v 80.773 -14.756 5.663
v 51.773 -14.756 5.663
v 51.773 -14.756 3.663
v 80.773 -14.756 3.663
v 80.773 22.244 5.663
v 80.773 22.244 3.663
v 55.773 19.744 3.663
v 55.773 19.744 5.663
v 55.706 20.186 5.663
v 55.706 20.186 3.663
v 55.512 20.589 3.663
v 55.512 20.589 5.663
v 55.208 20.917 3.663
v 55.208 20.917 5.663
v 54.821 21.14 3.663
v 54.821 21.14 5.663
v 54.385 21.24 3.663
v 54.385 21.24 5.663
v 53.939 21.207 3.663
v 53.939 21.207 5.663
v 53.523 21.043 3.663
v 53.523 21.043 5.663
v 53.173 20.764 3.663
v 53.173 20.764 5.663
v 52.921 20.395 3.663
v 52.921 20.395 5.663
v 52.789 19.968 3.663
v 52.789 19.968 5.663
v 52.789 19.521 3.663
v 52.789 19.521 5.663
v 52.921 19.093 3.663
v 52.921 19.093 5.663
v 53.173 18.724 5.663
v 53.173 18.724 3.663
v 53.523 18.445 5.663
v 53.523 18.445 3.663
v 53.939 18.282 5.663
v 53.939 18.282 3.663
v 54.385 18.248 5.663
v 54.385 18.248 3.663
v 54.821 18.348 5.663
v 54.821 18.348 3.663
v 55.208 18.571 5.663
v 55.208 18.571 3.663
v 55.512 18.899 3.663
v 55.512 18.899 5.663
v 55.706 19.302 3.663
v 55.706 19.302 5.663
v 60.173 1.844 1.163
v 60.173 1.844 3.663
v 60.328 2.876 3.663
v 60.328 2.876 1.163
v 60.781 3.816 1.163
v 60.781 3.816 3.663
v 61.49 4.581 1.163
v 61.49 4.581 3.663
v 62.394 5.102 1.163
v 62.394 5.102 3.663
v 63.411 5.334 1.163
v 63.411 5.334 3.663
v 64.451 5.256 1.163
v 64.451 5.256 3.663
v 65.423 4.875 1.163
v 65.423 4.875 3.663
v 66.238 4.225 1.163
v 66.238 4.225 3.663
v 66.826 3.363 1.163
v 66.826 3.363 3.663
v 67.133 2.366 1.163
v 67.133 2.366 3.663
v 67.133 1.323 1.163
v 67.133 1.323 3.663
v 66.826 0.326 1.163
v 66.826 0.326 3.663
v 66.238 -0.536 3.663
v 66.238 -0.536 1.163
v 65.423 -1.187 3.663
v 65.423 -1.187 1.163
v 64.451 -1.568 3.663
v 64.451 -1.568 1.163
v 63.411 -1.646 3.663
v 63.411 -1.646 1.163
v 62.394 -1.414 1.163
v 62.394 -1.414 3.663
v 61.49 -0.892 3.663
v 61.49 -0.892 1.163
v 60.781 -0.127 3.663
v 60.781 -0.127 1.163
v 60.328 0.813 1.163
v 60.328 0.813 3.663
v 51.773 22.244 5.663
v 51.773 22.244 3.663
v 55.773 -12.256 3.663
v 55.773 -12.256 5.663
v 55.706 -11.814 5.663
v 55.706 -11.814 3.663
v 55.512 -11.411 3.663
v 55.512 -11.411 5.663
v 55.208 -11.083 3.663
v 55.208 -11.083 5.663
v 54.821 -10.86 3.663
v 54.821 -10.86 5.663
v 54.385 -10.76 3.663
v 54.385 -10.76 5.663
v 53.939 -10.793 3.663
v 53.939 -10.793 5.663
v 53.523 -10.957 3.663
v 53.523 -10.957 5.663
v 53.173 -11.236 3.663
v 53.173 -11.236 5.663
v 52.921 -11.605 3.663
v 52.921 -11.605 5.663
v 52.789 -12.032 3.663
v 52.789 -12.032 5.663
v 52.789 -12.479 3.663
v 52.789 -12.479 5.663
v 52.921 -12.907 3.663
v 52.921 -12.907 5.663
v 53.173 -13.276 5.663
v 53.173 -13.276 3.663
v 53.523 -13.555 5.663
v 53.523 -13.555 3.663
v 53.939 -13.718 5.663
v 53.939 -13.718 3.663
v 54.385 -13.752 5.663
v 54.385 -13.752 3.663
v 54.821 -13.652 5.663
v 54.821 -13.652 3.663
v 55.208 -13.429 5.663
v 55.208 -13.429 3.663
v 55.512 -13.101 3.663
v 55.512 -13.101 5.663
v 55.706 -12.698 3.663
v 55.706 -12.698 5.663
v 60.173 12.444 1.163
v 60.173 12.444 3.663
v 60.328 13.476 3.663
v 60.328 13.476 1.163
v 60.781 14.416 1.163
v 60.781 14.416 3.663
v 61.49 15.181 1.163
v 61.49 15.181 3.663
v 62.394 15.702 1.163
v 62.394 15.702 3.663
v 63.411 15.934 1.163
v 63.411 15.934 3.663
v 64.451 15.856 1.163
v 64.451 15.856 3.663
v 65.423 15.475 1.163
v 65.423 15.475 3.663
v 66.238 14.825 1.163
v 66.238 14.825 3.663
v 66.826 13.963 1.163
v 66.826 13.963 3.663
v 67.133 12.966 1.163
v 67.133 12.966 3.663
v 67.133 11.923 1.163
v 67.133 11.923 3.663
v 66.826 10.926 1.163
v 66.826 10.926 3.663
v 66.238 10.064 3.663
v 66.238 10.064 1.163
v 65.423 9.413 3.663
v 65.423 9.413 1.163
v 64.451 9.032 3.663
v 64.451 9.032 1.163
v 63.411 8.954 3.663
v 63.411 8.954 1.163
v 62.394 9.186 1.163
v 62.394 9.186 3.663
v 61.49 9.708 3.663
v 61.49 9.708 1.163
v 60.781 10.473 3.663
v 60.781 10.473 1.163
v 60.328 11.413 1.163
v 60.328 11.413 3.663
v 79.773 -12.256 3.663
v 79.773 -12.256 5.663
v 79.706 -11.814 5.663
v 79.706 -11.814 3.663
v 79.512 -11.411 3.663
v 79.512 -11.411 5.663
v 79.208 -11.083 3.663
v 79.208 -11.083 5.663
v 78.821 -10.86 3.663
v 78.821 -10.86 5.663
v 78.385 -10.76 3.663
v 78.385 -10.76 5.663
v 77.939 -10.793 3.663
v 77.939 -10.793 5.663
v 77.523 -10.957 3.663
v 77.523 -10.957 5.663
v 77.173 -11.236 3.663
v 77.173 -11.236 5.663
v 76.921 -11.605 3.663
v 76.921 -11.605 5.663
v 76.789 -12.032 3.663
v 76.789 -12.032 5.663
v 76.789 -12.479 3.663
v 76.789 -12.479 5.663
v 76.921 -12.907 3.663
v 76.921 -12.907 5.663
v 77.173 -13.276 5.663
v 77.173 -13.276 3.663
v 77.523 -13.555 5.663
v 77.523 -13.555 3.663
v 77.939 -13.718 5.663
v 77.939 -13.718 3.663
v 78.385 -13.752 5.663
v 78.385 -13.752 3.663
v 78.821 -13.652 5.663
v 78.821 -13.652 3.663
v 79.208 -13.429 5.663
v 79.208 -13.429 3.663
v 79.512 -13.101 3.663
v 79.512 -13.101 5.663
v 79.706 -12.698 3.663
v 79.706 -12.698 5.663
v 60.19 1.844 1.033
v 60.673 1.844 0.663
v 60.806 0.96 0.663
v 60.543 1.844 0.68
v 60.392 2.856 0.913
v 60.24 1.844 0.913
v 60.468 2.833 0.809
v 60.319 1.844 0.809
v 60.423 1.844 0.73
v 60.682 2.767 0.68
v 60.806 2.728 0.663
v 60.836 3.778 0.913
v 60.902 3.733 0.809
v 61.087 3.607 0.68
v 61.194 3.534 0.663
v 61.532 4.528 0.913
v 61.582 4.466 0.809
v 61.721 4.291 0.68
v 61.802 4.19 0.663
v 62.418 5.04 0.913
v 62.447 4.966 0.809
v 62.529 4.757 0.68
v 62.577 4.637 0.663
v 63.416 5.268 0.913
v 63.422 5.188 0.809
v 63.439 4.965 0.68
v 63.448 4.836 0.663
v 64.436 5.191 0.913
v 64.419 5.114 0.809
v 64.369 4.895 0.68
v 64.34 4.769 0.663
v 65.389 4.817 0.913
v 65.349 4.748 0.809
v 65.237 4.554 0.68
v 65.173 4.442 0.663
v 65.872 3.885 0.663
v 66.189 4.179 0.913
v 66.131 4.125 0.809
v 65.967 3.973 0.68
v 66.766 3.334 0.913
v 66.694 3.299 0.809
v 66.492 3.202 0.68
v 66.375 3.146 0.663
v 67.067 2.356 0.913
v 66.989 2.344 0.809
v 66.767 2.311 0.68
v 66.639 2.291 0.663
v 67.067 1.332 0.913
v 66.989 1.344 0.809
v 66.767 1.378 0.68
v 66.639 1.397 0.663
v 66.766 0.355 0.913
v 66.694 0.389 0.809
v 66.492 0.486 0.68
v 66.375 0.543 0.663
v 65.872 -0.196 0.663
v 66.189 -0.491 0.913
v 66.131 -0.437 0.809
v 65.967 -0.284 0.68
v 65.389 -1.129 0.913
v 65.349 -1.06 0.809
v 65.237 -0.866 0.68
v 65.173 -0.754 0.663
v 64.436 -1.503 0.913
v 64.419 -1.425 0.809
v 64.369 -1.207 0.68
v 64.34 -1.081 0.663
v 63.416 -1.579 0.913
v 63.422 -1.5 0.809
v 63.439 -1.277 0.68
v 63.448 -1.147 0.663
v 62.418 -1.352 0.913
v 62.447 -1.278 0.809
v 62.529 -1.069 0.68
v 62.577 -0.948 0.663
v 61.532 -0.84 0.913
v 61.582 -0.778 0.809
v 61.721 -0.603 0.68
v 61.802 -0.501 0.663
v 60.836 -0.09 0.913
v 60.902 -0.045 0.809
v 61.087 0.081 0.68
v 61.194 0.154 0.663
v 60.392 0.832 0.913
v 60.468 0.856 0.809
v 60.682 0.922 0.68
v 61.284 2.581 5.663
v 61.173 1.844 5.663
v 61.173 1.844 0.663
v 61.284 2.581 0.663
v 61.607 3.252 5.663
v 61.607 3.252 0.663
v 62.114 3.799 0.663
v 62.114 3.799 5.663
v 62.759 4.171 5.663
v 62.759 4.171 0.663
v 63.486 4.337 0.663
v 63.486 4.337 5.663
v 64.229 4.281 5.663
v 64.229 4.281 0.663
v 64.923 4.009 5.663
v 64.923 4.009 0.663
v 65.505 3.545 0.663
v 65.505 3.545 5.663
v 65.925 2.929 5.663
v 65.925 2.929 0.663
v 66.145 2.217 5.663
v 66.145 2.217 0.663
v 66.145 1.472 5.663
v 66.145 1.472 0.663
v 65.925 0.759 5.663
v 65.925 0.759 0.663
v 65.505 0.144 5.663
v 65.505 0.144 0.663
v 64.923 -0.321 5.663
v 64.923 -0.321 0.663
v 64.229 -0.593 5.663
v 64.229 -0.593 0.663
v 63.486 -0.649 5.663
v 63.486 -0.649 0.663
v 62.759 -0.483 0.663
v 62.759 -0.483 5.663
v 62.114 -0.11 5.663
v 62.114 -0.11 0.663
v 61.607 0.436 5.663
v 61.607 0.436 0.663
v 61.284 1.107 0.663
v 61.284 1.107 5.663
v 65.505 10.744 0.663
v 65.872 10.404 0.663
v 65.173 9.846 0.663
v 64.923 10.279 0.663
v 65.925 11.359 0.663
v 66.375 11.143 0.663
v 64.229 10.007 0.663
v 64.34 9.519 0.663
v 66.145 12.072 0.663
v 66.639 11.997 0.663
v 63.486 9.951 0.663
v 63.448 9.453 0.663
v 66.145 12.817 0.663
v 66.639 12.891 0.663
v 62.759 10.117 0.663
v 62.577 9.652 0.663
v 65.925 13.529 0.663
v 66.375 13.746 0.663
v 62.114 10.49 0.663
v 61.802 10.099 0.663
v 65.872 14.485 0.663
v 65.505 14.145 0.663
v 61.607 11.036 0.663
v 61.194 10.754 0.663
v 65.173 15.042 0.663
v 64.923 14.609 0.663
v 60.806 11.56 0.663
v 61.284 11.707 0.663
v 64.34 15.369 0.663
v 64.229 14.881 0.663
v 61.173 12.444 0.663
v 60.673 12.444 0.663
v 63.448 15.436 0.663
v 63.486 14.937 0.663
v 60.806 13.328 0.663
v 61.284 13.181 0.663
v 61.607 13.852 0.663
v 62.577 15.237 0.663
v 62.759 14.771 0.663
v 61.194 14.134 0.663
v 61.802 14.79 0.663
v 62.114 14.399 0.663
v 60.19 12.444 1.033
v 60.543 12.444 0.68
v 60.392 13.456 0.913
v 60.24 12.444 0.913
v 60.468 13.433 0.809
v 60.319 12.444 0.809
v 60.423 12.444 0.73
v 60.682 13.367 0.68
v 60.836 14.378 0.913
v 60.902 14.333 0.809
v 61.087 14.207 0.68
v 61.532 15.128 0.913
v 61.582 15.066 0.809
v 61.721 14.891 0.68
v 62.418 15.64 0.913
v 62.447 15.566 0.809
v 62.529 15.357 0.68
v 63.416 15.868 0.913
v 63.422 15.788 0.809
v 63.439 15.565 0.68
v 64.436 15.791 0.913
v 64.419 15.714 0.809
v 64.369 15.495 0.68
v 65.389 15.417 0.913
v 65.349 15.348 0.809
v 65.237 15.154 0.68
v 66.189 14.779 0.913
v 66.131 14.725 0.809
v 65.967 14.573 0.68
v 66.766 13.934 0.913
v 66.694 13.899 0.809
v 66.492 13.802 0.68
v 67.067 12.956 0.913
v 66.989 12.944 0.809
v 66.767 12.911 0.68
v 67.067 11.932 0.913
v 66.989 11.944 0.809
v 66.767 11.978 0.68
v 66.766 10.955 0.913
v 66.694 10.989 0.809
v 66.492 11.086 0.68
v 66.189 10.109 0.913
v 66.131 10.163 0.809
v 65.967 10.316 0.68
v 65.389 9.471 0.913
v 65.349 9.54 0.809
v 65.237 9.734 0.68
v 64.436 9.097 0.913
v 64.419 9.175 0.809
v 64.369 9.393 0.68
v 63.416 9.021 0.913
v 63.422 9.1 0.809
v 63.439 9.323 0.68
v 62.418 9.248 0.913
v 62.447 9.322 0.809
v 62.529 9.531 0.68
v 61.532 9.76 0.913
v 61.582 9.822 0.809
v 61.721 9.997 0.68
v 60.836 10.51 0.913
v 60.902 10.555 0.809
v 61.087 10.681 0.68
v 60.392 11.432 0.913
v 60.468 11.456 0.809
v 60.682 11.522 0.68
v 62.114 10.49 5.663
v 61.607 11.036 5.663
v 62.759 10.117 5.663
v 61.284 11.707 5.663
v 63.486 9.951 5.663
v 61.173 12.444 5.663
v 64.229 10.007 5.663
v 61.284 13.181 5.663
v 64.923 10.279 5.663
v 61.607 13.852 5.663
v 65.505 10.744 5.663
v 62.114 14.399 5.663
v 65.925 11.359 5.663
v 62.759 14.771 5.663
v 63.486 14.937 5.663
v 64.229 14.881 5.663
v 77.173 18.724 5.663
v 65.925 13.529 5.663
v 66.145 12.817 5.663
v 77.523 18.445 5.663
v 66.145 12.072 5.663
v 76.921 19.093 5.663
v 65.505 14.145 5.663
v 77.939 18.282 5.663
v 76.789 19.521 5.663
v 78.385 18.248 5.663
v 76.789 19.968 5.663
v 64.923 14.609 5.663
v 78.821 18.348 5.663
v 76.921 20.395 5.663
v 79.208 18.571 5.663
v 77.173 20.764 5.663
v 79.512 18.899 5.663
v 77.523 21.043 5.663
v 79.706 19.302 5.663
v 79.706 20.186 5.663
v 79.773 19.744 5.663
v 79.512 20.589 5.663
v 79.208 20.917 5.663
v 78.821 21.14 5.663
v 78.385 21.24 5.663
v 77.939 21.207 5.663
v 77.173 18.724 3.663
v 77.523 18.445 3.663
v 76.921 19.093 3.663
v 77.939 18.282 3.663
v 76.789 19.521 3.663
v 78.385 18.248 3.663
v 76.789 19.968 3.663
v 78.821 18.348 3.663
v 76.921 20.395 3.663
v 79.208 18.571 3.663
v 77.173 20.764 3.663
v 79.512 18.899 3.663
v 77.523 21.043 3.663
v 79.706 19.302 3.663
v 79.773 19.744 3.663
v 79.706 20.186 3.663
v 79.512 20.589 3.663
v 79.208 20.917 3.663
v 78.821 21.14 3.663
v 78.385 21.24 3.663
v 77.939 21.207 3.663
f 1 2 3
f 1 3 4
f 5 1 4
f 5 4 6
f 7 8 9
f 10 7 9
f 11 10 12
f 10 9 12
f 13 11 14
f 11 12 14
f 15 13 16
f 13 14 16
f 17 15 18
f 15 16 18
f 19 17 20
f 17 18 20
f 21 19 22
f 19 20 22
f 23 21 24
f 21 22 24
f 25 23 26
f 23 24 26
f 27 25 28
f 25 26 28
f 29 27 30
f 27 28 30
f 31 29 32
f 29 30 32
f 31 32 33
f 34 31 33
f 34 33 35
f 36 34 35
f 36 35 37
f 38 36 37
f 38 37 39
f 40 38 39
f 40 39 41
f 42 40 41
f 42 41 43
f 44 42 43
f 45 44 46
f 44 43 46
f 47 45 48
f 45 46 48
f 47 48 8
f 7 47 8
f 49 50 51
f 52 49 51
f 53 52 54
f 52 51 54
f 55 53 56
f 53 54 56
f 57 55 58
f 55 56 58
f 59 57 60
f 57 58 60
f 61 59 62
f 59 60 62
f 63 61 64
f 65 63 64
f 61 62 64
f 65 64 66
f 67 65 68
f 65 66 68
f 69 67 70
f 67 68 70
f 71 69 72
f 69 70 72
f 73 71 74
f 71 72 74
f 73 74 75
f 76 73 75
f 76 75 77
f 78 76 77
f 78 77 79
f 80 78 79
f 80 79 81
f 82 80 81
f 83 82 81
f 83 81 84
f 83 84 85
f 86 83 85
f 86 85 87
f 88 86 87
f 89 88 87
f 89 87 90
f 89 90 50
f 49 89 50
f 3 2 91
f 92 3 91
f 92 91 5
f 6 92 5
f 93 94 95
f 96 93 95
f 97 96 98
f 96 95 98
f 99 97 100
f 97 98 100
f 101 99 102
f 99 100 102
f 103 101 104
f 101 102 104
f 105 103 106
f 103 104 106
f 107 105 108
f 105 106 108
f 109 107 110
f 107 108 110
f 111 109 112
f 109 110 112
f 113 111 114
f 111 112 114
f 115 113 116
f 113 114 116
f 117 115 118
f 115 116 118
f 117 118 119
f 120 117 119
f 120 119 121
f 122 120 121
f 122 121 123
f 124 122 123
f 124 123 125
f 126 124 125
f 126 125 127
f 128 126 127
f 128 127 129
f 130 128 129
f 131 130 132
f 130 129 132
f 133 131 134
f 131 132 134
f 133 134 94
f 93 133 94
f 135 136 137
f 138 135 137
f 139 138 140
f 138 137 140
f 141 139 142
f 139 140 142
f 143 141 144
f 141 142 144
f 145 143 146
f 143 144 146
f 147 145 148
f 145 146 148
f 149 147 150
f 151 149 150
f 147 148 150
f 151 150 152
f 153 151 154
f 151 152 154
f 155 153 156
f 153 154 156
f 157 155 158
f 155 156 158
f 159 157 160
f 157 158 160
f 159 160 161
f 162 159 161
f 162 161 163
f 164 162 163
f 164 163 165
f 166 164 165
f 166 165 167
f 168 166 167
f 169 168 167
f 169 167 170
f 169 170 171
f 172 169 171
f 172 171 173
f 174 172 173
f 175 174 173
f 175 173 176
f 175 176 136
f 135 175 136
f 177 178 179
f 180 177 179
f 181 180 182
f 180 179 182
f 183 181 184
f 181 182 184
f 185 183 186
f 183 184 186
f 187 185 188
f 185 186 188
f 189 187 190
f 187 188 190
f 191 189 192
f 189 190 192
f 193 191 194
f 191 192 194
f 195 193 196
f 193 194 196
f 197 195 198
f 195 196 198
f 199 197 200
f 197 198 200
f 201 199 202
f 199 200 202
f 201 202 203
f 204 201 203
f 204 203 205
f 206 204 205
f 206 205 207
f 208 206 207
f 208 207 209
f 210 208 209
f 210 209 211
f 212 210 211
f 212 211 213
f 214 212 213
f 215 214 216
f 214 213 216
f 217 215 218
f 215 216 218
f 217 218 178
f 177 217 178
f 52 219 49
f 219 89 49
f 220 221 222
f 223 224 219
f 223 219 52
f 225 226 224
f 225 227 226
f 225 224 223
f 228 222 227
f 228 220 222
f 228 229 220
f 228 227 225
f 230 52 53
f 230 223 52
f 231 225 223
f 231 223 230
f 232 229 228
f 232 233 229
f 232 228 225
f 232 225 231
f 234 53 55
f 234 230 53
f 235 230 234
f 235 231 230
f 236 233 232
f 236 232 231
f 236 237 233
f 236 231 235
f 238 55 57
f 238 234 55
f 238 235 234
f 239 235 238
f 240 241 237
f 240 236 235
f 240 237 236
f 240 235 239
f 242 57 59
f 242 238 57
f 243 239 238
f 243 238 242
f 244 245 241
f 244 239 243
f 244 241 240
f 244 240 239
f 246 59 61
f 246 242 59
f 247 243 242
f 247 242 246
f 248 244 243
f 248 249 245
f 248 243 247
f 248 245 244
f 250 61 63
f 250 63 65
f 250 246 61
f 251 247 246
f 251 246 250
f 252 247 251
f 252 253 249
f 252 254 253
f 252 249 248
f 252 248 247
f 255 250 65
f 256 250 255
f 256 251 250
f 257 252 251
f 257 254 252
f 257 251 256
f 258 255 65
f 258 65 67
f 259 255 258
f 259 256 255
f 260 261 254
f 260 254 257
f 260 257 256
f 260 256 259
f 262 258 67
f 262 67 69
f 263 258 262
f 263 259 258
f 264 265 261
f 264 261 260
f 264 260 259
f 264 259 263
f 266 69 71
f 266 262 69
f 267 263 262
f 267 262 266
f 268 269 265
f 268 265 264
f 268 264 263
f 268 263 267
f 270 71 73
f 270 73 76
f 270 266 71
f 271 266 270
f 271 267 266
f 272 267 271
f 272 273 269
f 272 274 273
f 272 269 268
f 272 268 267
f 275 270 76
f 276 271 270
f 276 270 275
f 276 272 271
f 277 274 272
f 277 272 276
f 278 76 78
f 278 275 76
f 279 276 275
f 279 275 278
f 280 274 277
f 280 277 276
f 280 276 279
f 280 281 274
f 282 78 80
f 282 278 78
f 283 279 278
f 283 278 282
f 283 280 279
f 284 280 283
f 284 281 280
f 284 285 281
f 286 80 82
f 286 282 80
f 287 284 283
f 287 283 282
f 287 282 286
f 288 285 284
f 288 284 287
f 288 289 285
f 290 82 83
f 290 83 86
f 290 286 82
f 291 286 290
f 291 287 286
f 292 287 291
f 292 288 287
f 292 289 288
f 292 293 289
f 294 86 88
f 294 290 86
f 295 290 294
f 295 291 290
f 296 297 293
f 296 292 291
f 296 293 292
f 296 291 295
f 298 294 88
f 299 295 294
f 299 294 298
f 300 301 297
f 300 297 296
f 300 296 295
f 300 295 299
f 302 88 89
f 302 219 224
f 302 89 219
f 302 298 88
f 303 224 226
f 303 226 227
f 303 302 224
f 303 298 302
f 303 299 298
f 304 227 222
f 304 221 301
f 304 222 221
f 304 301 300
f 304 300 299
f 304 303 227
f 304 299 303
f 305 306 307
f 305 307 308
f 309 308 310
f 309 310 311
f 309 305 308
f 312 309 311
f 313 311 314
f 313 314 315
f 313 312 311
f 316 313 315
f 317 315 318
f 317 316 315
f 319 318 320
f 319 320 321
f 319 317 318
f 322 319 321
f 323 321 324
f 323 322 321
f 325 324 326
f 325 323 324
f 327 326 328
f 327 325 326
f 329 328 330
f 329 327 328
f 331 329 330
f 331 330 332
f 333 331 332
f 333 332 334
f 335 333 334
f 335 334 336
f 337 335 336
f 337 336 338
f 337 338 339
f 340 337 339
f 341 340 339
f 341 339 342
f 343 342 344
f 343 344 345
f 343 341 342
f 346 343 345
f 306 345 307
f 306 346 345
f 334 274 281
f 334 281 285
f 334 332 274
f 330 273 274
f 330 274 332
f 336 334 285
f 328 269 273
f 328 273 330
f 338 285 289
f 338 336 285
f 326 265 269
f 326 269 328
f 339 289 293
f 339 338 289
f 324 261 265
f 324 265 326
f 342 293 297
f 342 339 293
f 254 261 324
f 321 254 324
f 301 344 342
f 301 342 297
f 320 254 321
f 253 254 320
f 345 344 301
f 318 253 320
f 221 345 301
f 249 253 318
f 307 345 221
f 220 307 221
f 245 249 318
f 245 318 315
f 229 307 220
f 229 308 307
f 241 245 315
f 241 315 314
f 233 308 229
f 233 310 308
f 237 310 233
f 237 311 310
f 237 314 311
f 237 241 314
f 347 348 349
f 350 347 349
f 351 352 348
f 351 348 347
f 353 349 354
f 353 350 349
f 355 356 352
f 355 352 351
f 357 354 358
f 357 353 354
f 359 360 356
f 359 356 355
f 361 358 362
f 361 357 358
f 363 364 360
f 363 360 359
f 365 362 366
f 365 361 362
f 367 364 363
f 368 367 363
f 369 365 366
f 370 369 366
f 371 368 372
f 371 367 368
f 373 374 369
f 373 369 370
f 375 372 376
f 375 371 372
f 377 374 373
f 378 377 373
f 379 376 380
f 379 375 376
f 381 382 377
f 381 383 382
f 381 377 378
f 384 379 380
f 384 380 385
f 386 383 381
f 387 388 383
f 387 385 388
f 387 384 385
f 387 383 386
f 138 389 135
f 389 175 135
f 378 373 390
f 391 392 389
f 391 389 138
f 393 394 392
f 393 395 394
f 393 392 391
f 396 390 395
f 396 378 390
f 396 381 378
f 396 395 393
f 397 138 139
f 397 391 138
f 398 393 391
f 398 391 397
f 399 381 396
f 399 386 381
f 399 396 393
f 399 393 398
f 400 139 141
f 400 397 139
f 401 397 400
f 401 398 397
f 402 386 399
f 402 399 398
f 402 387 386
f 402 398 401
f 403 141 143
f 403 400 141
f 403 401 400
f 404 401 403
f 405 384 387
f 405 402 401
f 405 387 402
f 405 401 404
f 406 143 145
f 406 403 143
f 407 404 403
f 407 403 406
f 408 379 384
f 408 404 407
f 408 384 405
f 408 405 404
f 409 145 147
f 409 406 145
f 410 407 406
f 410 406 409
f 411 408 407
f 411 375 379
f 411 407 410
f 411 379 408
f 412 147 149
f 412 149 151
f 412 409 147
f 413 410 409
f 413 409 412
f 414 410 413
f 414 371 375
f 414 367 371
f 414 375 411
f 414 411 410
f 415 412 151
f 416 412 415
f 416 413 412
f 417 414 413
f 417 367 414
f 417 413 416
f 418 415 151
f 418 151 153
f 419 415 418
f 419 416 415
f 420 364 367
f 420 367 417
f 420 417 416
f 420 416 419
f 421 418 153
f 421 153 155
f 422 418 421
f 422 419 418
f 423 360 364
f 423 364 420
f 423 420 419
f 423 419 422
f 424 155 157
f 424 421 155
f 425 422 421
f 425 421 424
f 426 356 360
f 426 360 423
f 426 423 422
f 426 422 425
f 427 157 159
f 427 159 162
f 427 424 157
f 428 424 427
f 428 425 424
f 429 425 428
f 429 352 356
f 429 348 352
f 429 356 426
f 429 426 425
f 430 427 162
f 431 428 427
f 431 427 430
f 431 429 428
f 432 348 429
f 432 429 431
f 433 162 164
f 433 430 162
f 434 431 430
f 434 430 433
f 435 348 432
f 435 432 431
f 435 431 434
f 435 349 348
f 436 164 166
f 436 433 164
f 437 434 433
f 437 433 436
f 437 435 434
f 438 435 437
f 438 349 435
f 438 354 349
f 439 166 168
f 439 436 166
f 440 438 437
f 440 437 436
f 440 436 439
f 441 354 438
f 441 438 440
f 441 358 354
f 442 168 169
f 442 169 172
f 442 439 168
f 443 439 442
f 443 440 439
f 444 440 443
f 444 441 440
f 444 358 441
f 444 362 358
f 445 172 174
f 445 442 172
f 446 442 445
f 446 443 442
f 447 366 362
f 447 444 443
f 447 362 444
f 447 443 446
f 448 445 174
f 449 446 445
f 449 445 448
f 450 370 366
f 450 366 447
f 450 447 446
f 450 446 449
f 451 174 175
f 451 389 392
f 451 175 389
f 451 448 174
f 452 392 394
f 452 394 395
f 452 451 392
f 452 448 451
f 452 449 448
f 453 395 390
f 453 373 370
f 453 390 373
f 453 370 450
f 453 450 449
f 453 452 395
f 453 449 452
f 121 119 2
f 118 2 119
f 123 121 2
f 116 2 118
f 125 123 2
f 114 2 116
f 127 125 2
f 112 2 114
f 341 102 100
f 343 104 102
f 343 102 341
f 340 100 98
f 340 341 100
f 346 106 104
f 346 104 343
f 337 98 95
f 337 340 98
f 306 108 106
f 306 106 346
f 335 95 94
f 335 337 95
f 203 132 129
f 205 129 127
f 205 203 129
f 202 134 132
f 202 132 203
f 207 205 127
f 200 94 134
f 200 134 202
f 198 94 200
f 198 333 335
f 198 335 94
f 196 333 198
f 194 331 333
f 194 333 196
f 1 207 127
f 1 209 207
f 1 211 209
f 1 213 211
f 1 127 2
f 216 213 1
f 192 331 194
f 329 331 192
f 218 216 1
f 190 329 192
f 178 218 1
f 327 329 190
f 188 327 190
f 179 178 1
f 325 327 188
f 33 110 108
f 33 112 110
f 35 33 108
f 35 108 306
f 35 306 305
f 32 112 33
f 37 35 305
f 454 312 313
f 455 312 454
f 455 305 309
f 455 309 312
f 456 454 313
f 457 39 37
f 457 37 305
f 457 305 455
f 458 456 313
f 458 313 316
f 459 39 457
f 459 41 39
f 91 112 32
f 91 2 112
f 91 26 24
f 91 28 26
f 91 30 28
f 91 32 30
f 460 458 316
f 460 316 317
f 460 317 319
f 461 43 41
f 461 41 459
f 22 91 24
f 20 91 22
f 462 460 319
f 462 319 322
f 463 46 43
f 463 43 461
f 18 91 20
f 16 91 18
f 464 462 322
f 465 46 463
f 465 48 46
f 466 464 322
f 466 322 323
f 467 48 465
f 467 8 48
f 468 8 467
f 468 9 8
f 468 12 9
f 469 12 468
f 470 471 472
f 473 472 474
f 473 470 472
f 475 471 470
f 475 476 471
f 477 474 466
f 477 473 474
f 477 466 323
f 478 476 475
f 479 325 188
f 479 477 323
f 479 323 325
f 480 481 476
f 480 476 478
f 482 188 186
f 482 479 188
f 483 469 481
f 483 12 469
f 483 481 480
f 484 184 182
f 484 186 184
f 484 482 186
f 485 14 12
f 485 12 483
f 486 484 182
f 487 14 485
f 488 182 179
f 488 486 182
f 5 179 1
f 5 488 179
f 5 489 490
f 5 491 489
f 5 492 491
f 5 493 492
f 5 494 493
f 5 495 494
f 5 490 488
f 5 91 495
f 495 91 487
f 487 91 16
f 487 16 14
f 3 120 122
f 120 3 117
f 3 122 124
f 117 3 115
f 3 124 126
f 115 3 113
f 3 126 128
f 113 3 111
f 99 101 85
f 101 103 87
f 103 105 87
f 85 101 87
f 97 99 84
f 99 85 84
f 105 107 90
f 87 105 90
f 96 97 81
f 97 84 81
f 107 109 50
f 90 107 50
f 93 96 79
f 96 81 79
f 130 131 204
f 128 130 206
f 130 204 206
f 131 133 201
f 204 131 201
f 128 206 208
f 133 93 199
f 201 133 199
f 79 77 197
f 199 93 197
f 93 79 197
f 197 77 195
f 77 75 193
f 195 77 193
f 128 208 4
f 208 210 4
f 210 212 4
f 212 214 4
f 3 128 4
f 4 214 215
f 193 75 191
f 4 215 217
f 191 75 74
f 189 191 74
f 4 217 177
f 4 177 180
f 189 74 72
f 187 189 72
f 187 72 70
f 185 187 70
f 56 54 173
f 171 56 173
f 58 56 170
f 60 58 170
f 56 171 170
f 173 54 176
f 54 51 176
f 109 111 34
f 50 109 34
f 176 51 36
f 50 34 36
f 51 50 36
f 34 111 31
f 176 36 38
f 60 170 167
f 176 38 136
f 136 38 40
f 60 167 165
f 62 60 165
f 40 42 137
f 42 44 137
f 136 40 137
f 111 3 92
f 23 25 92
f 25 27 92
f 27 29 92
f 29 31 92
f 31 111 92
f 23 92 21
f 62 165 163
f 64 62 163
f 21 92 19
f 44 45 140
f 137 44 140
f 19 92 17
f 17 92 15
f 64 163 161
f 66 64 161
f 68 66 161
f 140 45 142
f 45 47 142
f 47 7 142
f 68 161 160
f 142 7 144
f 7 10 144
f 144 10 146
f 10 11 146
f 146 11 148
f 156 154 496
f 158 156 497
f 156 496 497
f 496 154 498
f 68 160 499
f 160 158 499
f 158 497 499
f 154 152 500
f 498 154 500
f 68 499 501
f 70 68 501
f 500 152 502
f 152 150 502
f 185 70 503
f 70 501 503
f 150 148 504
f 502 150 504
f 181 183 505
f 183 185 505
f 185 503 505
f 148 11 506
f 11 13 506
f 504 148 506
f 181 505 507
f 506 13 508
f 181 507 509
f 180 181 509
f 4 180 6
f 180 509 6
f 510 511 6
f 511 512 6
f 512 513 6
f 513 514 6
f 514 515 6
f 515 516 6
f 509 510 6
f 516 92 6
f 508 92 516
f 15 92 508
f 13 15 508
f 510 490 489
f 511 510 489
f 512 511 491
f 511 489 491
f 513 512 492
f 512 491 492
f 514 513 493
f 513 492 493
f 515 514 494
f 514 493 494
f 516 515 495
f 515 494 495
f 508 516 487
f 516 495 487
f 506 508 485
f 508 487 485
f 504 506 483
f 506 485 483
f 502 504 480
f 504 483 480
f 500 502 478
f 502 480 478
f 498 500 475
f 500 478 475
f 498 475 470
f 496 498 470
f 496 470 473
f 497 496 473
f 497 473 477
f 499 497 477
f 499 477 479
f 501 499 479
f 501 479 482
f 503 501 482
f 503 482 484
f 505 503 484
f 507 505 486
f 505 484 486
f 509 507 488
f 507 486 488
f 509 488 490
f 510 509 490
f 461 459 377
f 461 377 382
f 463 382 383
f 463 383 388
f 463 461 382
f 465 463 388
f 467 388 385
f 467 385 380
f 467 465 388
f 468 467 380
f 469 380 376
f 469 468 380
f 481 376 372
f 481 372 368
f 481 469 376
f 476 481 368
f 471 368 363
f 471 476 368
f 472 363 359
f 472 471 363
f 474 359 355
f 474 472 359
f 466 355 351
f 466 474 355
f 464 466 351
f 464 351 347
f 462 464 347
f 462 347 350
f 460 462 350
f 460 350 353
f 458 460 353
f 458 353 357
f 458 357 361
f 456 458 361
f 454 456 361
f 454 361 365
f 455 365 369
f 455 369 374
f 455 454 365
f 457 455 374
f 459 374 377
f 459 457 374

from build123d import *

# Parameters (mm, degrees)
SKETCH2_W           = 19
SKETCH2_H           = 27
SKETCH2_R           = 3.5
BOSS_EXTRUDE1_DEPTH = 2
SKETCH3_R           = 3.5
SKETCH3_R_2         = 2.5
BOSS_EXTRUDE2_DEPTH = 5
FILLET1_R           = 0.5
SKETCH6_W           = 29
SKETCH6_H           = 37
SKETCH6_R           = 1.5
SKETCH6_W_2         = 19
SKETCH6_H_2         = 27
BOSS_EXTRUDE6_DEPTH = 2


with BuildPart() as part:
    # Sketch2 → Boss-Extrude1 (new body)
    with BuildSketch(Plane(origin=(0, 0, 5.662636572), x_dir=(-1, 0, 0), z_dir=(0, 0, -1))):
        with Locations((-66.272536925, 3.74415348)):
            Rectangle(SKETCH2_W, SKETCH2_H)
        with Locations((-63.672536925, 12.44415348)):
            Circle(SKETCH2_R, mode=Mode.SUBTRACT)
        with Locations((-63.672536925, 1.84415348)):
            Circle(SKETCH2_R, mode=Mode.SUBTRACT)
    extrude(amount=BOSS_EXTRUDE1_DEPTH)

    # Sketch3 → Boss-Extrude2 (add)
    # profile 1 of 2: a face of its own
    with BuildSketch(Plane(origin=(0, 0, 5.662636572), x_dir=(-1, 0, 0), z_dir=(0, 0, -1))):
        with Locations((-63.672536925, 12.44415348)):
            Circle(SKETCH3_R)
        with Locations((-63.672536925, 12.44415348)):
            Circle(SKETCH3_R_2, mode=Mode.SUBTRACT)
    # profile 2 of 2: a face of its own
    with BuildSketch(Plane(origin=(0, 0, 5.662636572), x_dir=(-1, 0, 0), z_dir=(0, 0, -1))):
        with Locations((-63.672536925, 1.84415348)):
            Circle(SKETCH3_R)
        with Locations((-63.672536925, 1.84415348)):
            Circle(SKETCH3_R_2, mode=Mode.SUBTRACT)
    extrude(amount=BOSS_EXTRUDE2_DEPTH)

    # Fillet1
    fillet1_edges = [part.edges().sort_by_distance(p)[0] for p in [
        (67.172536925, 12.44415348, 0.662636572),
        (67.172536925, 1.84415348, 0.662636572),
    ]]
    fillet(fillet1_edges, radius=FILLET1_R)

    # Sketch6 → Boss-Extrude6 (add)
    with BuildSketch(Plane.XY.offset(5.662636572)):
        with Locations((66.272536925, 3.74415348)):
            Rectangle(SKETCH6_W, SKETCH6_H)
        with Locations((54.272536925, 19.74415348)):
            Circle(SKETCH6_R, mode=Mode.SUBTRACT)
        with Locations((78.272536925, 19.74415348)):
            Circle(SKETCH6_R, mode=Mode.SUBTRACT)
        with Locations((78.272536925, -12.25584652)):
            Circle(SKETCH6_R, mode=Mode.SUBTRACT)
        with Locations((54.272536925, -12.25584652)):
            Circle(SKETCH6_R, mode=Mode.SUBTRACT)
        with Locations((66.272536925, 3.74415348)):
            Rectangle(SKETCH6_W_2, SKETCH6_H_2, mode=Mode.SUBTRACT)
    extrude(amount=-BOSS_EXTRUDE6_DEPTH)


solid = part.part
